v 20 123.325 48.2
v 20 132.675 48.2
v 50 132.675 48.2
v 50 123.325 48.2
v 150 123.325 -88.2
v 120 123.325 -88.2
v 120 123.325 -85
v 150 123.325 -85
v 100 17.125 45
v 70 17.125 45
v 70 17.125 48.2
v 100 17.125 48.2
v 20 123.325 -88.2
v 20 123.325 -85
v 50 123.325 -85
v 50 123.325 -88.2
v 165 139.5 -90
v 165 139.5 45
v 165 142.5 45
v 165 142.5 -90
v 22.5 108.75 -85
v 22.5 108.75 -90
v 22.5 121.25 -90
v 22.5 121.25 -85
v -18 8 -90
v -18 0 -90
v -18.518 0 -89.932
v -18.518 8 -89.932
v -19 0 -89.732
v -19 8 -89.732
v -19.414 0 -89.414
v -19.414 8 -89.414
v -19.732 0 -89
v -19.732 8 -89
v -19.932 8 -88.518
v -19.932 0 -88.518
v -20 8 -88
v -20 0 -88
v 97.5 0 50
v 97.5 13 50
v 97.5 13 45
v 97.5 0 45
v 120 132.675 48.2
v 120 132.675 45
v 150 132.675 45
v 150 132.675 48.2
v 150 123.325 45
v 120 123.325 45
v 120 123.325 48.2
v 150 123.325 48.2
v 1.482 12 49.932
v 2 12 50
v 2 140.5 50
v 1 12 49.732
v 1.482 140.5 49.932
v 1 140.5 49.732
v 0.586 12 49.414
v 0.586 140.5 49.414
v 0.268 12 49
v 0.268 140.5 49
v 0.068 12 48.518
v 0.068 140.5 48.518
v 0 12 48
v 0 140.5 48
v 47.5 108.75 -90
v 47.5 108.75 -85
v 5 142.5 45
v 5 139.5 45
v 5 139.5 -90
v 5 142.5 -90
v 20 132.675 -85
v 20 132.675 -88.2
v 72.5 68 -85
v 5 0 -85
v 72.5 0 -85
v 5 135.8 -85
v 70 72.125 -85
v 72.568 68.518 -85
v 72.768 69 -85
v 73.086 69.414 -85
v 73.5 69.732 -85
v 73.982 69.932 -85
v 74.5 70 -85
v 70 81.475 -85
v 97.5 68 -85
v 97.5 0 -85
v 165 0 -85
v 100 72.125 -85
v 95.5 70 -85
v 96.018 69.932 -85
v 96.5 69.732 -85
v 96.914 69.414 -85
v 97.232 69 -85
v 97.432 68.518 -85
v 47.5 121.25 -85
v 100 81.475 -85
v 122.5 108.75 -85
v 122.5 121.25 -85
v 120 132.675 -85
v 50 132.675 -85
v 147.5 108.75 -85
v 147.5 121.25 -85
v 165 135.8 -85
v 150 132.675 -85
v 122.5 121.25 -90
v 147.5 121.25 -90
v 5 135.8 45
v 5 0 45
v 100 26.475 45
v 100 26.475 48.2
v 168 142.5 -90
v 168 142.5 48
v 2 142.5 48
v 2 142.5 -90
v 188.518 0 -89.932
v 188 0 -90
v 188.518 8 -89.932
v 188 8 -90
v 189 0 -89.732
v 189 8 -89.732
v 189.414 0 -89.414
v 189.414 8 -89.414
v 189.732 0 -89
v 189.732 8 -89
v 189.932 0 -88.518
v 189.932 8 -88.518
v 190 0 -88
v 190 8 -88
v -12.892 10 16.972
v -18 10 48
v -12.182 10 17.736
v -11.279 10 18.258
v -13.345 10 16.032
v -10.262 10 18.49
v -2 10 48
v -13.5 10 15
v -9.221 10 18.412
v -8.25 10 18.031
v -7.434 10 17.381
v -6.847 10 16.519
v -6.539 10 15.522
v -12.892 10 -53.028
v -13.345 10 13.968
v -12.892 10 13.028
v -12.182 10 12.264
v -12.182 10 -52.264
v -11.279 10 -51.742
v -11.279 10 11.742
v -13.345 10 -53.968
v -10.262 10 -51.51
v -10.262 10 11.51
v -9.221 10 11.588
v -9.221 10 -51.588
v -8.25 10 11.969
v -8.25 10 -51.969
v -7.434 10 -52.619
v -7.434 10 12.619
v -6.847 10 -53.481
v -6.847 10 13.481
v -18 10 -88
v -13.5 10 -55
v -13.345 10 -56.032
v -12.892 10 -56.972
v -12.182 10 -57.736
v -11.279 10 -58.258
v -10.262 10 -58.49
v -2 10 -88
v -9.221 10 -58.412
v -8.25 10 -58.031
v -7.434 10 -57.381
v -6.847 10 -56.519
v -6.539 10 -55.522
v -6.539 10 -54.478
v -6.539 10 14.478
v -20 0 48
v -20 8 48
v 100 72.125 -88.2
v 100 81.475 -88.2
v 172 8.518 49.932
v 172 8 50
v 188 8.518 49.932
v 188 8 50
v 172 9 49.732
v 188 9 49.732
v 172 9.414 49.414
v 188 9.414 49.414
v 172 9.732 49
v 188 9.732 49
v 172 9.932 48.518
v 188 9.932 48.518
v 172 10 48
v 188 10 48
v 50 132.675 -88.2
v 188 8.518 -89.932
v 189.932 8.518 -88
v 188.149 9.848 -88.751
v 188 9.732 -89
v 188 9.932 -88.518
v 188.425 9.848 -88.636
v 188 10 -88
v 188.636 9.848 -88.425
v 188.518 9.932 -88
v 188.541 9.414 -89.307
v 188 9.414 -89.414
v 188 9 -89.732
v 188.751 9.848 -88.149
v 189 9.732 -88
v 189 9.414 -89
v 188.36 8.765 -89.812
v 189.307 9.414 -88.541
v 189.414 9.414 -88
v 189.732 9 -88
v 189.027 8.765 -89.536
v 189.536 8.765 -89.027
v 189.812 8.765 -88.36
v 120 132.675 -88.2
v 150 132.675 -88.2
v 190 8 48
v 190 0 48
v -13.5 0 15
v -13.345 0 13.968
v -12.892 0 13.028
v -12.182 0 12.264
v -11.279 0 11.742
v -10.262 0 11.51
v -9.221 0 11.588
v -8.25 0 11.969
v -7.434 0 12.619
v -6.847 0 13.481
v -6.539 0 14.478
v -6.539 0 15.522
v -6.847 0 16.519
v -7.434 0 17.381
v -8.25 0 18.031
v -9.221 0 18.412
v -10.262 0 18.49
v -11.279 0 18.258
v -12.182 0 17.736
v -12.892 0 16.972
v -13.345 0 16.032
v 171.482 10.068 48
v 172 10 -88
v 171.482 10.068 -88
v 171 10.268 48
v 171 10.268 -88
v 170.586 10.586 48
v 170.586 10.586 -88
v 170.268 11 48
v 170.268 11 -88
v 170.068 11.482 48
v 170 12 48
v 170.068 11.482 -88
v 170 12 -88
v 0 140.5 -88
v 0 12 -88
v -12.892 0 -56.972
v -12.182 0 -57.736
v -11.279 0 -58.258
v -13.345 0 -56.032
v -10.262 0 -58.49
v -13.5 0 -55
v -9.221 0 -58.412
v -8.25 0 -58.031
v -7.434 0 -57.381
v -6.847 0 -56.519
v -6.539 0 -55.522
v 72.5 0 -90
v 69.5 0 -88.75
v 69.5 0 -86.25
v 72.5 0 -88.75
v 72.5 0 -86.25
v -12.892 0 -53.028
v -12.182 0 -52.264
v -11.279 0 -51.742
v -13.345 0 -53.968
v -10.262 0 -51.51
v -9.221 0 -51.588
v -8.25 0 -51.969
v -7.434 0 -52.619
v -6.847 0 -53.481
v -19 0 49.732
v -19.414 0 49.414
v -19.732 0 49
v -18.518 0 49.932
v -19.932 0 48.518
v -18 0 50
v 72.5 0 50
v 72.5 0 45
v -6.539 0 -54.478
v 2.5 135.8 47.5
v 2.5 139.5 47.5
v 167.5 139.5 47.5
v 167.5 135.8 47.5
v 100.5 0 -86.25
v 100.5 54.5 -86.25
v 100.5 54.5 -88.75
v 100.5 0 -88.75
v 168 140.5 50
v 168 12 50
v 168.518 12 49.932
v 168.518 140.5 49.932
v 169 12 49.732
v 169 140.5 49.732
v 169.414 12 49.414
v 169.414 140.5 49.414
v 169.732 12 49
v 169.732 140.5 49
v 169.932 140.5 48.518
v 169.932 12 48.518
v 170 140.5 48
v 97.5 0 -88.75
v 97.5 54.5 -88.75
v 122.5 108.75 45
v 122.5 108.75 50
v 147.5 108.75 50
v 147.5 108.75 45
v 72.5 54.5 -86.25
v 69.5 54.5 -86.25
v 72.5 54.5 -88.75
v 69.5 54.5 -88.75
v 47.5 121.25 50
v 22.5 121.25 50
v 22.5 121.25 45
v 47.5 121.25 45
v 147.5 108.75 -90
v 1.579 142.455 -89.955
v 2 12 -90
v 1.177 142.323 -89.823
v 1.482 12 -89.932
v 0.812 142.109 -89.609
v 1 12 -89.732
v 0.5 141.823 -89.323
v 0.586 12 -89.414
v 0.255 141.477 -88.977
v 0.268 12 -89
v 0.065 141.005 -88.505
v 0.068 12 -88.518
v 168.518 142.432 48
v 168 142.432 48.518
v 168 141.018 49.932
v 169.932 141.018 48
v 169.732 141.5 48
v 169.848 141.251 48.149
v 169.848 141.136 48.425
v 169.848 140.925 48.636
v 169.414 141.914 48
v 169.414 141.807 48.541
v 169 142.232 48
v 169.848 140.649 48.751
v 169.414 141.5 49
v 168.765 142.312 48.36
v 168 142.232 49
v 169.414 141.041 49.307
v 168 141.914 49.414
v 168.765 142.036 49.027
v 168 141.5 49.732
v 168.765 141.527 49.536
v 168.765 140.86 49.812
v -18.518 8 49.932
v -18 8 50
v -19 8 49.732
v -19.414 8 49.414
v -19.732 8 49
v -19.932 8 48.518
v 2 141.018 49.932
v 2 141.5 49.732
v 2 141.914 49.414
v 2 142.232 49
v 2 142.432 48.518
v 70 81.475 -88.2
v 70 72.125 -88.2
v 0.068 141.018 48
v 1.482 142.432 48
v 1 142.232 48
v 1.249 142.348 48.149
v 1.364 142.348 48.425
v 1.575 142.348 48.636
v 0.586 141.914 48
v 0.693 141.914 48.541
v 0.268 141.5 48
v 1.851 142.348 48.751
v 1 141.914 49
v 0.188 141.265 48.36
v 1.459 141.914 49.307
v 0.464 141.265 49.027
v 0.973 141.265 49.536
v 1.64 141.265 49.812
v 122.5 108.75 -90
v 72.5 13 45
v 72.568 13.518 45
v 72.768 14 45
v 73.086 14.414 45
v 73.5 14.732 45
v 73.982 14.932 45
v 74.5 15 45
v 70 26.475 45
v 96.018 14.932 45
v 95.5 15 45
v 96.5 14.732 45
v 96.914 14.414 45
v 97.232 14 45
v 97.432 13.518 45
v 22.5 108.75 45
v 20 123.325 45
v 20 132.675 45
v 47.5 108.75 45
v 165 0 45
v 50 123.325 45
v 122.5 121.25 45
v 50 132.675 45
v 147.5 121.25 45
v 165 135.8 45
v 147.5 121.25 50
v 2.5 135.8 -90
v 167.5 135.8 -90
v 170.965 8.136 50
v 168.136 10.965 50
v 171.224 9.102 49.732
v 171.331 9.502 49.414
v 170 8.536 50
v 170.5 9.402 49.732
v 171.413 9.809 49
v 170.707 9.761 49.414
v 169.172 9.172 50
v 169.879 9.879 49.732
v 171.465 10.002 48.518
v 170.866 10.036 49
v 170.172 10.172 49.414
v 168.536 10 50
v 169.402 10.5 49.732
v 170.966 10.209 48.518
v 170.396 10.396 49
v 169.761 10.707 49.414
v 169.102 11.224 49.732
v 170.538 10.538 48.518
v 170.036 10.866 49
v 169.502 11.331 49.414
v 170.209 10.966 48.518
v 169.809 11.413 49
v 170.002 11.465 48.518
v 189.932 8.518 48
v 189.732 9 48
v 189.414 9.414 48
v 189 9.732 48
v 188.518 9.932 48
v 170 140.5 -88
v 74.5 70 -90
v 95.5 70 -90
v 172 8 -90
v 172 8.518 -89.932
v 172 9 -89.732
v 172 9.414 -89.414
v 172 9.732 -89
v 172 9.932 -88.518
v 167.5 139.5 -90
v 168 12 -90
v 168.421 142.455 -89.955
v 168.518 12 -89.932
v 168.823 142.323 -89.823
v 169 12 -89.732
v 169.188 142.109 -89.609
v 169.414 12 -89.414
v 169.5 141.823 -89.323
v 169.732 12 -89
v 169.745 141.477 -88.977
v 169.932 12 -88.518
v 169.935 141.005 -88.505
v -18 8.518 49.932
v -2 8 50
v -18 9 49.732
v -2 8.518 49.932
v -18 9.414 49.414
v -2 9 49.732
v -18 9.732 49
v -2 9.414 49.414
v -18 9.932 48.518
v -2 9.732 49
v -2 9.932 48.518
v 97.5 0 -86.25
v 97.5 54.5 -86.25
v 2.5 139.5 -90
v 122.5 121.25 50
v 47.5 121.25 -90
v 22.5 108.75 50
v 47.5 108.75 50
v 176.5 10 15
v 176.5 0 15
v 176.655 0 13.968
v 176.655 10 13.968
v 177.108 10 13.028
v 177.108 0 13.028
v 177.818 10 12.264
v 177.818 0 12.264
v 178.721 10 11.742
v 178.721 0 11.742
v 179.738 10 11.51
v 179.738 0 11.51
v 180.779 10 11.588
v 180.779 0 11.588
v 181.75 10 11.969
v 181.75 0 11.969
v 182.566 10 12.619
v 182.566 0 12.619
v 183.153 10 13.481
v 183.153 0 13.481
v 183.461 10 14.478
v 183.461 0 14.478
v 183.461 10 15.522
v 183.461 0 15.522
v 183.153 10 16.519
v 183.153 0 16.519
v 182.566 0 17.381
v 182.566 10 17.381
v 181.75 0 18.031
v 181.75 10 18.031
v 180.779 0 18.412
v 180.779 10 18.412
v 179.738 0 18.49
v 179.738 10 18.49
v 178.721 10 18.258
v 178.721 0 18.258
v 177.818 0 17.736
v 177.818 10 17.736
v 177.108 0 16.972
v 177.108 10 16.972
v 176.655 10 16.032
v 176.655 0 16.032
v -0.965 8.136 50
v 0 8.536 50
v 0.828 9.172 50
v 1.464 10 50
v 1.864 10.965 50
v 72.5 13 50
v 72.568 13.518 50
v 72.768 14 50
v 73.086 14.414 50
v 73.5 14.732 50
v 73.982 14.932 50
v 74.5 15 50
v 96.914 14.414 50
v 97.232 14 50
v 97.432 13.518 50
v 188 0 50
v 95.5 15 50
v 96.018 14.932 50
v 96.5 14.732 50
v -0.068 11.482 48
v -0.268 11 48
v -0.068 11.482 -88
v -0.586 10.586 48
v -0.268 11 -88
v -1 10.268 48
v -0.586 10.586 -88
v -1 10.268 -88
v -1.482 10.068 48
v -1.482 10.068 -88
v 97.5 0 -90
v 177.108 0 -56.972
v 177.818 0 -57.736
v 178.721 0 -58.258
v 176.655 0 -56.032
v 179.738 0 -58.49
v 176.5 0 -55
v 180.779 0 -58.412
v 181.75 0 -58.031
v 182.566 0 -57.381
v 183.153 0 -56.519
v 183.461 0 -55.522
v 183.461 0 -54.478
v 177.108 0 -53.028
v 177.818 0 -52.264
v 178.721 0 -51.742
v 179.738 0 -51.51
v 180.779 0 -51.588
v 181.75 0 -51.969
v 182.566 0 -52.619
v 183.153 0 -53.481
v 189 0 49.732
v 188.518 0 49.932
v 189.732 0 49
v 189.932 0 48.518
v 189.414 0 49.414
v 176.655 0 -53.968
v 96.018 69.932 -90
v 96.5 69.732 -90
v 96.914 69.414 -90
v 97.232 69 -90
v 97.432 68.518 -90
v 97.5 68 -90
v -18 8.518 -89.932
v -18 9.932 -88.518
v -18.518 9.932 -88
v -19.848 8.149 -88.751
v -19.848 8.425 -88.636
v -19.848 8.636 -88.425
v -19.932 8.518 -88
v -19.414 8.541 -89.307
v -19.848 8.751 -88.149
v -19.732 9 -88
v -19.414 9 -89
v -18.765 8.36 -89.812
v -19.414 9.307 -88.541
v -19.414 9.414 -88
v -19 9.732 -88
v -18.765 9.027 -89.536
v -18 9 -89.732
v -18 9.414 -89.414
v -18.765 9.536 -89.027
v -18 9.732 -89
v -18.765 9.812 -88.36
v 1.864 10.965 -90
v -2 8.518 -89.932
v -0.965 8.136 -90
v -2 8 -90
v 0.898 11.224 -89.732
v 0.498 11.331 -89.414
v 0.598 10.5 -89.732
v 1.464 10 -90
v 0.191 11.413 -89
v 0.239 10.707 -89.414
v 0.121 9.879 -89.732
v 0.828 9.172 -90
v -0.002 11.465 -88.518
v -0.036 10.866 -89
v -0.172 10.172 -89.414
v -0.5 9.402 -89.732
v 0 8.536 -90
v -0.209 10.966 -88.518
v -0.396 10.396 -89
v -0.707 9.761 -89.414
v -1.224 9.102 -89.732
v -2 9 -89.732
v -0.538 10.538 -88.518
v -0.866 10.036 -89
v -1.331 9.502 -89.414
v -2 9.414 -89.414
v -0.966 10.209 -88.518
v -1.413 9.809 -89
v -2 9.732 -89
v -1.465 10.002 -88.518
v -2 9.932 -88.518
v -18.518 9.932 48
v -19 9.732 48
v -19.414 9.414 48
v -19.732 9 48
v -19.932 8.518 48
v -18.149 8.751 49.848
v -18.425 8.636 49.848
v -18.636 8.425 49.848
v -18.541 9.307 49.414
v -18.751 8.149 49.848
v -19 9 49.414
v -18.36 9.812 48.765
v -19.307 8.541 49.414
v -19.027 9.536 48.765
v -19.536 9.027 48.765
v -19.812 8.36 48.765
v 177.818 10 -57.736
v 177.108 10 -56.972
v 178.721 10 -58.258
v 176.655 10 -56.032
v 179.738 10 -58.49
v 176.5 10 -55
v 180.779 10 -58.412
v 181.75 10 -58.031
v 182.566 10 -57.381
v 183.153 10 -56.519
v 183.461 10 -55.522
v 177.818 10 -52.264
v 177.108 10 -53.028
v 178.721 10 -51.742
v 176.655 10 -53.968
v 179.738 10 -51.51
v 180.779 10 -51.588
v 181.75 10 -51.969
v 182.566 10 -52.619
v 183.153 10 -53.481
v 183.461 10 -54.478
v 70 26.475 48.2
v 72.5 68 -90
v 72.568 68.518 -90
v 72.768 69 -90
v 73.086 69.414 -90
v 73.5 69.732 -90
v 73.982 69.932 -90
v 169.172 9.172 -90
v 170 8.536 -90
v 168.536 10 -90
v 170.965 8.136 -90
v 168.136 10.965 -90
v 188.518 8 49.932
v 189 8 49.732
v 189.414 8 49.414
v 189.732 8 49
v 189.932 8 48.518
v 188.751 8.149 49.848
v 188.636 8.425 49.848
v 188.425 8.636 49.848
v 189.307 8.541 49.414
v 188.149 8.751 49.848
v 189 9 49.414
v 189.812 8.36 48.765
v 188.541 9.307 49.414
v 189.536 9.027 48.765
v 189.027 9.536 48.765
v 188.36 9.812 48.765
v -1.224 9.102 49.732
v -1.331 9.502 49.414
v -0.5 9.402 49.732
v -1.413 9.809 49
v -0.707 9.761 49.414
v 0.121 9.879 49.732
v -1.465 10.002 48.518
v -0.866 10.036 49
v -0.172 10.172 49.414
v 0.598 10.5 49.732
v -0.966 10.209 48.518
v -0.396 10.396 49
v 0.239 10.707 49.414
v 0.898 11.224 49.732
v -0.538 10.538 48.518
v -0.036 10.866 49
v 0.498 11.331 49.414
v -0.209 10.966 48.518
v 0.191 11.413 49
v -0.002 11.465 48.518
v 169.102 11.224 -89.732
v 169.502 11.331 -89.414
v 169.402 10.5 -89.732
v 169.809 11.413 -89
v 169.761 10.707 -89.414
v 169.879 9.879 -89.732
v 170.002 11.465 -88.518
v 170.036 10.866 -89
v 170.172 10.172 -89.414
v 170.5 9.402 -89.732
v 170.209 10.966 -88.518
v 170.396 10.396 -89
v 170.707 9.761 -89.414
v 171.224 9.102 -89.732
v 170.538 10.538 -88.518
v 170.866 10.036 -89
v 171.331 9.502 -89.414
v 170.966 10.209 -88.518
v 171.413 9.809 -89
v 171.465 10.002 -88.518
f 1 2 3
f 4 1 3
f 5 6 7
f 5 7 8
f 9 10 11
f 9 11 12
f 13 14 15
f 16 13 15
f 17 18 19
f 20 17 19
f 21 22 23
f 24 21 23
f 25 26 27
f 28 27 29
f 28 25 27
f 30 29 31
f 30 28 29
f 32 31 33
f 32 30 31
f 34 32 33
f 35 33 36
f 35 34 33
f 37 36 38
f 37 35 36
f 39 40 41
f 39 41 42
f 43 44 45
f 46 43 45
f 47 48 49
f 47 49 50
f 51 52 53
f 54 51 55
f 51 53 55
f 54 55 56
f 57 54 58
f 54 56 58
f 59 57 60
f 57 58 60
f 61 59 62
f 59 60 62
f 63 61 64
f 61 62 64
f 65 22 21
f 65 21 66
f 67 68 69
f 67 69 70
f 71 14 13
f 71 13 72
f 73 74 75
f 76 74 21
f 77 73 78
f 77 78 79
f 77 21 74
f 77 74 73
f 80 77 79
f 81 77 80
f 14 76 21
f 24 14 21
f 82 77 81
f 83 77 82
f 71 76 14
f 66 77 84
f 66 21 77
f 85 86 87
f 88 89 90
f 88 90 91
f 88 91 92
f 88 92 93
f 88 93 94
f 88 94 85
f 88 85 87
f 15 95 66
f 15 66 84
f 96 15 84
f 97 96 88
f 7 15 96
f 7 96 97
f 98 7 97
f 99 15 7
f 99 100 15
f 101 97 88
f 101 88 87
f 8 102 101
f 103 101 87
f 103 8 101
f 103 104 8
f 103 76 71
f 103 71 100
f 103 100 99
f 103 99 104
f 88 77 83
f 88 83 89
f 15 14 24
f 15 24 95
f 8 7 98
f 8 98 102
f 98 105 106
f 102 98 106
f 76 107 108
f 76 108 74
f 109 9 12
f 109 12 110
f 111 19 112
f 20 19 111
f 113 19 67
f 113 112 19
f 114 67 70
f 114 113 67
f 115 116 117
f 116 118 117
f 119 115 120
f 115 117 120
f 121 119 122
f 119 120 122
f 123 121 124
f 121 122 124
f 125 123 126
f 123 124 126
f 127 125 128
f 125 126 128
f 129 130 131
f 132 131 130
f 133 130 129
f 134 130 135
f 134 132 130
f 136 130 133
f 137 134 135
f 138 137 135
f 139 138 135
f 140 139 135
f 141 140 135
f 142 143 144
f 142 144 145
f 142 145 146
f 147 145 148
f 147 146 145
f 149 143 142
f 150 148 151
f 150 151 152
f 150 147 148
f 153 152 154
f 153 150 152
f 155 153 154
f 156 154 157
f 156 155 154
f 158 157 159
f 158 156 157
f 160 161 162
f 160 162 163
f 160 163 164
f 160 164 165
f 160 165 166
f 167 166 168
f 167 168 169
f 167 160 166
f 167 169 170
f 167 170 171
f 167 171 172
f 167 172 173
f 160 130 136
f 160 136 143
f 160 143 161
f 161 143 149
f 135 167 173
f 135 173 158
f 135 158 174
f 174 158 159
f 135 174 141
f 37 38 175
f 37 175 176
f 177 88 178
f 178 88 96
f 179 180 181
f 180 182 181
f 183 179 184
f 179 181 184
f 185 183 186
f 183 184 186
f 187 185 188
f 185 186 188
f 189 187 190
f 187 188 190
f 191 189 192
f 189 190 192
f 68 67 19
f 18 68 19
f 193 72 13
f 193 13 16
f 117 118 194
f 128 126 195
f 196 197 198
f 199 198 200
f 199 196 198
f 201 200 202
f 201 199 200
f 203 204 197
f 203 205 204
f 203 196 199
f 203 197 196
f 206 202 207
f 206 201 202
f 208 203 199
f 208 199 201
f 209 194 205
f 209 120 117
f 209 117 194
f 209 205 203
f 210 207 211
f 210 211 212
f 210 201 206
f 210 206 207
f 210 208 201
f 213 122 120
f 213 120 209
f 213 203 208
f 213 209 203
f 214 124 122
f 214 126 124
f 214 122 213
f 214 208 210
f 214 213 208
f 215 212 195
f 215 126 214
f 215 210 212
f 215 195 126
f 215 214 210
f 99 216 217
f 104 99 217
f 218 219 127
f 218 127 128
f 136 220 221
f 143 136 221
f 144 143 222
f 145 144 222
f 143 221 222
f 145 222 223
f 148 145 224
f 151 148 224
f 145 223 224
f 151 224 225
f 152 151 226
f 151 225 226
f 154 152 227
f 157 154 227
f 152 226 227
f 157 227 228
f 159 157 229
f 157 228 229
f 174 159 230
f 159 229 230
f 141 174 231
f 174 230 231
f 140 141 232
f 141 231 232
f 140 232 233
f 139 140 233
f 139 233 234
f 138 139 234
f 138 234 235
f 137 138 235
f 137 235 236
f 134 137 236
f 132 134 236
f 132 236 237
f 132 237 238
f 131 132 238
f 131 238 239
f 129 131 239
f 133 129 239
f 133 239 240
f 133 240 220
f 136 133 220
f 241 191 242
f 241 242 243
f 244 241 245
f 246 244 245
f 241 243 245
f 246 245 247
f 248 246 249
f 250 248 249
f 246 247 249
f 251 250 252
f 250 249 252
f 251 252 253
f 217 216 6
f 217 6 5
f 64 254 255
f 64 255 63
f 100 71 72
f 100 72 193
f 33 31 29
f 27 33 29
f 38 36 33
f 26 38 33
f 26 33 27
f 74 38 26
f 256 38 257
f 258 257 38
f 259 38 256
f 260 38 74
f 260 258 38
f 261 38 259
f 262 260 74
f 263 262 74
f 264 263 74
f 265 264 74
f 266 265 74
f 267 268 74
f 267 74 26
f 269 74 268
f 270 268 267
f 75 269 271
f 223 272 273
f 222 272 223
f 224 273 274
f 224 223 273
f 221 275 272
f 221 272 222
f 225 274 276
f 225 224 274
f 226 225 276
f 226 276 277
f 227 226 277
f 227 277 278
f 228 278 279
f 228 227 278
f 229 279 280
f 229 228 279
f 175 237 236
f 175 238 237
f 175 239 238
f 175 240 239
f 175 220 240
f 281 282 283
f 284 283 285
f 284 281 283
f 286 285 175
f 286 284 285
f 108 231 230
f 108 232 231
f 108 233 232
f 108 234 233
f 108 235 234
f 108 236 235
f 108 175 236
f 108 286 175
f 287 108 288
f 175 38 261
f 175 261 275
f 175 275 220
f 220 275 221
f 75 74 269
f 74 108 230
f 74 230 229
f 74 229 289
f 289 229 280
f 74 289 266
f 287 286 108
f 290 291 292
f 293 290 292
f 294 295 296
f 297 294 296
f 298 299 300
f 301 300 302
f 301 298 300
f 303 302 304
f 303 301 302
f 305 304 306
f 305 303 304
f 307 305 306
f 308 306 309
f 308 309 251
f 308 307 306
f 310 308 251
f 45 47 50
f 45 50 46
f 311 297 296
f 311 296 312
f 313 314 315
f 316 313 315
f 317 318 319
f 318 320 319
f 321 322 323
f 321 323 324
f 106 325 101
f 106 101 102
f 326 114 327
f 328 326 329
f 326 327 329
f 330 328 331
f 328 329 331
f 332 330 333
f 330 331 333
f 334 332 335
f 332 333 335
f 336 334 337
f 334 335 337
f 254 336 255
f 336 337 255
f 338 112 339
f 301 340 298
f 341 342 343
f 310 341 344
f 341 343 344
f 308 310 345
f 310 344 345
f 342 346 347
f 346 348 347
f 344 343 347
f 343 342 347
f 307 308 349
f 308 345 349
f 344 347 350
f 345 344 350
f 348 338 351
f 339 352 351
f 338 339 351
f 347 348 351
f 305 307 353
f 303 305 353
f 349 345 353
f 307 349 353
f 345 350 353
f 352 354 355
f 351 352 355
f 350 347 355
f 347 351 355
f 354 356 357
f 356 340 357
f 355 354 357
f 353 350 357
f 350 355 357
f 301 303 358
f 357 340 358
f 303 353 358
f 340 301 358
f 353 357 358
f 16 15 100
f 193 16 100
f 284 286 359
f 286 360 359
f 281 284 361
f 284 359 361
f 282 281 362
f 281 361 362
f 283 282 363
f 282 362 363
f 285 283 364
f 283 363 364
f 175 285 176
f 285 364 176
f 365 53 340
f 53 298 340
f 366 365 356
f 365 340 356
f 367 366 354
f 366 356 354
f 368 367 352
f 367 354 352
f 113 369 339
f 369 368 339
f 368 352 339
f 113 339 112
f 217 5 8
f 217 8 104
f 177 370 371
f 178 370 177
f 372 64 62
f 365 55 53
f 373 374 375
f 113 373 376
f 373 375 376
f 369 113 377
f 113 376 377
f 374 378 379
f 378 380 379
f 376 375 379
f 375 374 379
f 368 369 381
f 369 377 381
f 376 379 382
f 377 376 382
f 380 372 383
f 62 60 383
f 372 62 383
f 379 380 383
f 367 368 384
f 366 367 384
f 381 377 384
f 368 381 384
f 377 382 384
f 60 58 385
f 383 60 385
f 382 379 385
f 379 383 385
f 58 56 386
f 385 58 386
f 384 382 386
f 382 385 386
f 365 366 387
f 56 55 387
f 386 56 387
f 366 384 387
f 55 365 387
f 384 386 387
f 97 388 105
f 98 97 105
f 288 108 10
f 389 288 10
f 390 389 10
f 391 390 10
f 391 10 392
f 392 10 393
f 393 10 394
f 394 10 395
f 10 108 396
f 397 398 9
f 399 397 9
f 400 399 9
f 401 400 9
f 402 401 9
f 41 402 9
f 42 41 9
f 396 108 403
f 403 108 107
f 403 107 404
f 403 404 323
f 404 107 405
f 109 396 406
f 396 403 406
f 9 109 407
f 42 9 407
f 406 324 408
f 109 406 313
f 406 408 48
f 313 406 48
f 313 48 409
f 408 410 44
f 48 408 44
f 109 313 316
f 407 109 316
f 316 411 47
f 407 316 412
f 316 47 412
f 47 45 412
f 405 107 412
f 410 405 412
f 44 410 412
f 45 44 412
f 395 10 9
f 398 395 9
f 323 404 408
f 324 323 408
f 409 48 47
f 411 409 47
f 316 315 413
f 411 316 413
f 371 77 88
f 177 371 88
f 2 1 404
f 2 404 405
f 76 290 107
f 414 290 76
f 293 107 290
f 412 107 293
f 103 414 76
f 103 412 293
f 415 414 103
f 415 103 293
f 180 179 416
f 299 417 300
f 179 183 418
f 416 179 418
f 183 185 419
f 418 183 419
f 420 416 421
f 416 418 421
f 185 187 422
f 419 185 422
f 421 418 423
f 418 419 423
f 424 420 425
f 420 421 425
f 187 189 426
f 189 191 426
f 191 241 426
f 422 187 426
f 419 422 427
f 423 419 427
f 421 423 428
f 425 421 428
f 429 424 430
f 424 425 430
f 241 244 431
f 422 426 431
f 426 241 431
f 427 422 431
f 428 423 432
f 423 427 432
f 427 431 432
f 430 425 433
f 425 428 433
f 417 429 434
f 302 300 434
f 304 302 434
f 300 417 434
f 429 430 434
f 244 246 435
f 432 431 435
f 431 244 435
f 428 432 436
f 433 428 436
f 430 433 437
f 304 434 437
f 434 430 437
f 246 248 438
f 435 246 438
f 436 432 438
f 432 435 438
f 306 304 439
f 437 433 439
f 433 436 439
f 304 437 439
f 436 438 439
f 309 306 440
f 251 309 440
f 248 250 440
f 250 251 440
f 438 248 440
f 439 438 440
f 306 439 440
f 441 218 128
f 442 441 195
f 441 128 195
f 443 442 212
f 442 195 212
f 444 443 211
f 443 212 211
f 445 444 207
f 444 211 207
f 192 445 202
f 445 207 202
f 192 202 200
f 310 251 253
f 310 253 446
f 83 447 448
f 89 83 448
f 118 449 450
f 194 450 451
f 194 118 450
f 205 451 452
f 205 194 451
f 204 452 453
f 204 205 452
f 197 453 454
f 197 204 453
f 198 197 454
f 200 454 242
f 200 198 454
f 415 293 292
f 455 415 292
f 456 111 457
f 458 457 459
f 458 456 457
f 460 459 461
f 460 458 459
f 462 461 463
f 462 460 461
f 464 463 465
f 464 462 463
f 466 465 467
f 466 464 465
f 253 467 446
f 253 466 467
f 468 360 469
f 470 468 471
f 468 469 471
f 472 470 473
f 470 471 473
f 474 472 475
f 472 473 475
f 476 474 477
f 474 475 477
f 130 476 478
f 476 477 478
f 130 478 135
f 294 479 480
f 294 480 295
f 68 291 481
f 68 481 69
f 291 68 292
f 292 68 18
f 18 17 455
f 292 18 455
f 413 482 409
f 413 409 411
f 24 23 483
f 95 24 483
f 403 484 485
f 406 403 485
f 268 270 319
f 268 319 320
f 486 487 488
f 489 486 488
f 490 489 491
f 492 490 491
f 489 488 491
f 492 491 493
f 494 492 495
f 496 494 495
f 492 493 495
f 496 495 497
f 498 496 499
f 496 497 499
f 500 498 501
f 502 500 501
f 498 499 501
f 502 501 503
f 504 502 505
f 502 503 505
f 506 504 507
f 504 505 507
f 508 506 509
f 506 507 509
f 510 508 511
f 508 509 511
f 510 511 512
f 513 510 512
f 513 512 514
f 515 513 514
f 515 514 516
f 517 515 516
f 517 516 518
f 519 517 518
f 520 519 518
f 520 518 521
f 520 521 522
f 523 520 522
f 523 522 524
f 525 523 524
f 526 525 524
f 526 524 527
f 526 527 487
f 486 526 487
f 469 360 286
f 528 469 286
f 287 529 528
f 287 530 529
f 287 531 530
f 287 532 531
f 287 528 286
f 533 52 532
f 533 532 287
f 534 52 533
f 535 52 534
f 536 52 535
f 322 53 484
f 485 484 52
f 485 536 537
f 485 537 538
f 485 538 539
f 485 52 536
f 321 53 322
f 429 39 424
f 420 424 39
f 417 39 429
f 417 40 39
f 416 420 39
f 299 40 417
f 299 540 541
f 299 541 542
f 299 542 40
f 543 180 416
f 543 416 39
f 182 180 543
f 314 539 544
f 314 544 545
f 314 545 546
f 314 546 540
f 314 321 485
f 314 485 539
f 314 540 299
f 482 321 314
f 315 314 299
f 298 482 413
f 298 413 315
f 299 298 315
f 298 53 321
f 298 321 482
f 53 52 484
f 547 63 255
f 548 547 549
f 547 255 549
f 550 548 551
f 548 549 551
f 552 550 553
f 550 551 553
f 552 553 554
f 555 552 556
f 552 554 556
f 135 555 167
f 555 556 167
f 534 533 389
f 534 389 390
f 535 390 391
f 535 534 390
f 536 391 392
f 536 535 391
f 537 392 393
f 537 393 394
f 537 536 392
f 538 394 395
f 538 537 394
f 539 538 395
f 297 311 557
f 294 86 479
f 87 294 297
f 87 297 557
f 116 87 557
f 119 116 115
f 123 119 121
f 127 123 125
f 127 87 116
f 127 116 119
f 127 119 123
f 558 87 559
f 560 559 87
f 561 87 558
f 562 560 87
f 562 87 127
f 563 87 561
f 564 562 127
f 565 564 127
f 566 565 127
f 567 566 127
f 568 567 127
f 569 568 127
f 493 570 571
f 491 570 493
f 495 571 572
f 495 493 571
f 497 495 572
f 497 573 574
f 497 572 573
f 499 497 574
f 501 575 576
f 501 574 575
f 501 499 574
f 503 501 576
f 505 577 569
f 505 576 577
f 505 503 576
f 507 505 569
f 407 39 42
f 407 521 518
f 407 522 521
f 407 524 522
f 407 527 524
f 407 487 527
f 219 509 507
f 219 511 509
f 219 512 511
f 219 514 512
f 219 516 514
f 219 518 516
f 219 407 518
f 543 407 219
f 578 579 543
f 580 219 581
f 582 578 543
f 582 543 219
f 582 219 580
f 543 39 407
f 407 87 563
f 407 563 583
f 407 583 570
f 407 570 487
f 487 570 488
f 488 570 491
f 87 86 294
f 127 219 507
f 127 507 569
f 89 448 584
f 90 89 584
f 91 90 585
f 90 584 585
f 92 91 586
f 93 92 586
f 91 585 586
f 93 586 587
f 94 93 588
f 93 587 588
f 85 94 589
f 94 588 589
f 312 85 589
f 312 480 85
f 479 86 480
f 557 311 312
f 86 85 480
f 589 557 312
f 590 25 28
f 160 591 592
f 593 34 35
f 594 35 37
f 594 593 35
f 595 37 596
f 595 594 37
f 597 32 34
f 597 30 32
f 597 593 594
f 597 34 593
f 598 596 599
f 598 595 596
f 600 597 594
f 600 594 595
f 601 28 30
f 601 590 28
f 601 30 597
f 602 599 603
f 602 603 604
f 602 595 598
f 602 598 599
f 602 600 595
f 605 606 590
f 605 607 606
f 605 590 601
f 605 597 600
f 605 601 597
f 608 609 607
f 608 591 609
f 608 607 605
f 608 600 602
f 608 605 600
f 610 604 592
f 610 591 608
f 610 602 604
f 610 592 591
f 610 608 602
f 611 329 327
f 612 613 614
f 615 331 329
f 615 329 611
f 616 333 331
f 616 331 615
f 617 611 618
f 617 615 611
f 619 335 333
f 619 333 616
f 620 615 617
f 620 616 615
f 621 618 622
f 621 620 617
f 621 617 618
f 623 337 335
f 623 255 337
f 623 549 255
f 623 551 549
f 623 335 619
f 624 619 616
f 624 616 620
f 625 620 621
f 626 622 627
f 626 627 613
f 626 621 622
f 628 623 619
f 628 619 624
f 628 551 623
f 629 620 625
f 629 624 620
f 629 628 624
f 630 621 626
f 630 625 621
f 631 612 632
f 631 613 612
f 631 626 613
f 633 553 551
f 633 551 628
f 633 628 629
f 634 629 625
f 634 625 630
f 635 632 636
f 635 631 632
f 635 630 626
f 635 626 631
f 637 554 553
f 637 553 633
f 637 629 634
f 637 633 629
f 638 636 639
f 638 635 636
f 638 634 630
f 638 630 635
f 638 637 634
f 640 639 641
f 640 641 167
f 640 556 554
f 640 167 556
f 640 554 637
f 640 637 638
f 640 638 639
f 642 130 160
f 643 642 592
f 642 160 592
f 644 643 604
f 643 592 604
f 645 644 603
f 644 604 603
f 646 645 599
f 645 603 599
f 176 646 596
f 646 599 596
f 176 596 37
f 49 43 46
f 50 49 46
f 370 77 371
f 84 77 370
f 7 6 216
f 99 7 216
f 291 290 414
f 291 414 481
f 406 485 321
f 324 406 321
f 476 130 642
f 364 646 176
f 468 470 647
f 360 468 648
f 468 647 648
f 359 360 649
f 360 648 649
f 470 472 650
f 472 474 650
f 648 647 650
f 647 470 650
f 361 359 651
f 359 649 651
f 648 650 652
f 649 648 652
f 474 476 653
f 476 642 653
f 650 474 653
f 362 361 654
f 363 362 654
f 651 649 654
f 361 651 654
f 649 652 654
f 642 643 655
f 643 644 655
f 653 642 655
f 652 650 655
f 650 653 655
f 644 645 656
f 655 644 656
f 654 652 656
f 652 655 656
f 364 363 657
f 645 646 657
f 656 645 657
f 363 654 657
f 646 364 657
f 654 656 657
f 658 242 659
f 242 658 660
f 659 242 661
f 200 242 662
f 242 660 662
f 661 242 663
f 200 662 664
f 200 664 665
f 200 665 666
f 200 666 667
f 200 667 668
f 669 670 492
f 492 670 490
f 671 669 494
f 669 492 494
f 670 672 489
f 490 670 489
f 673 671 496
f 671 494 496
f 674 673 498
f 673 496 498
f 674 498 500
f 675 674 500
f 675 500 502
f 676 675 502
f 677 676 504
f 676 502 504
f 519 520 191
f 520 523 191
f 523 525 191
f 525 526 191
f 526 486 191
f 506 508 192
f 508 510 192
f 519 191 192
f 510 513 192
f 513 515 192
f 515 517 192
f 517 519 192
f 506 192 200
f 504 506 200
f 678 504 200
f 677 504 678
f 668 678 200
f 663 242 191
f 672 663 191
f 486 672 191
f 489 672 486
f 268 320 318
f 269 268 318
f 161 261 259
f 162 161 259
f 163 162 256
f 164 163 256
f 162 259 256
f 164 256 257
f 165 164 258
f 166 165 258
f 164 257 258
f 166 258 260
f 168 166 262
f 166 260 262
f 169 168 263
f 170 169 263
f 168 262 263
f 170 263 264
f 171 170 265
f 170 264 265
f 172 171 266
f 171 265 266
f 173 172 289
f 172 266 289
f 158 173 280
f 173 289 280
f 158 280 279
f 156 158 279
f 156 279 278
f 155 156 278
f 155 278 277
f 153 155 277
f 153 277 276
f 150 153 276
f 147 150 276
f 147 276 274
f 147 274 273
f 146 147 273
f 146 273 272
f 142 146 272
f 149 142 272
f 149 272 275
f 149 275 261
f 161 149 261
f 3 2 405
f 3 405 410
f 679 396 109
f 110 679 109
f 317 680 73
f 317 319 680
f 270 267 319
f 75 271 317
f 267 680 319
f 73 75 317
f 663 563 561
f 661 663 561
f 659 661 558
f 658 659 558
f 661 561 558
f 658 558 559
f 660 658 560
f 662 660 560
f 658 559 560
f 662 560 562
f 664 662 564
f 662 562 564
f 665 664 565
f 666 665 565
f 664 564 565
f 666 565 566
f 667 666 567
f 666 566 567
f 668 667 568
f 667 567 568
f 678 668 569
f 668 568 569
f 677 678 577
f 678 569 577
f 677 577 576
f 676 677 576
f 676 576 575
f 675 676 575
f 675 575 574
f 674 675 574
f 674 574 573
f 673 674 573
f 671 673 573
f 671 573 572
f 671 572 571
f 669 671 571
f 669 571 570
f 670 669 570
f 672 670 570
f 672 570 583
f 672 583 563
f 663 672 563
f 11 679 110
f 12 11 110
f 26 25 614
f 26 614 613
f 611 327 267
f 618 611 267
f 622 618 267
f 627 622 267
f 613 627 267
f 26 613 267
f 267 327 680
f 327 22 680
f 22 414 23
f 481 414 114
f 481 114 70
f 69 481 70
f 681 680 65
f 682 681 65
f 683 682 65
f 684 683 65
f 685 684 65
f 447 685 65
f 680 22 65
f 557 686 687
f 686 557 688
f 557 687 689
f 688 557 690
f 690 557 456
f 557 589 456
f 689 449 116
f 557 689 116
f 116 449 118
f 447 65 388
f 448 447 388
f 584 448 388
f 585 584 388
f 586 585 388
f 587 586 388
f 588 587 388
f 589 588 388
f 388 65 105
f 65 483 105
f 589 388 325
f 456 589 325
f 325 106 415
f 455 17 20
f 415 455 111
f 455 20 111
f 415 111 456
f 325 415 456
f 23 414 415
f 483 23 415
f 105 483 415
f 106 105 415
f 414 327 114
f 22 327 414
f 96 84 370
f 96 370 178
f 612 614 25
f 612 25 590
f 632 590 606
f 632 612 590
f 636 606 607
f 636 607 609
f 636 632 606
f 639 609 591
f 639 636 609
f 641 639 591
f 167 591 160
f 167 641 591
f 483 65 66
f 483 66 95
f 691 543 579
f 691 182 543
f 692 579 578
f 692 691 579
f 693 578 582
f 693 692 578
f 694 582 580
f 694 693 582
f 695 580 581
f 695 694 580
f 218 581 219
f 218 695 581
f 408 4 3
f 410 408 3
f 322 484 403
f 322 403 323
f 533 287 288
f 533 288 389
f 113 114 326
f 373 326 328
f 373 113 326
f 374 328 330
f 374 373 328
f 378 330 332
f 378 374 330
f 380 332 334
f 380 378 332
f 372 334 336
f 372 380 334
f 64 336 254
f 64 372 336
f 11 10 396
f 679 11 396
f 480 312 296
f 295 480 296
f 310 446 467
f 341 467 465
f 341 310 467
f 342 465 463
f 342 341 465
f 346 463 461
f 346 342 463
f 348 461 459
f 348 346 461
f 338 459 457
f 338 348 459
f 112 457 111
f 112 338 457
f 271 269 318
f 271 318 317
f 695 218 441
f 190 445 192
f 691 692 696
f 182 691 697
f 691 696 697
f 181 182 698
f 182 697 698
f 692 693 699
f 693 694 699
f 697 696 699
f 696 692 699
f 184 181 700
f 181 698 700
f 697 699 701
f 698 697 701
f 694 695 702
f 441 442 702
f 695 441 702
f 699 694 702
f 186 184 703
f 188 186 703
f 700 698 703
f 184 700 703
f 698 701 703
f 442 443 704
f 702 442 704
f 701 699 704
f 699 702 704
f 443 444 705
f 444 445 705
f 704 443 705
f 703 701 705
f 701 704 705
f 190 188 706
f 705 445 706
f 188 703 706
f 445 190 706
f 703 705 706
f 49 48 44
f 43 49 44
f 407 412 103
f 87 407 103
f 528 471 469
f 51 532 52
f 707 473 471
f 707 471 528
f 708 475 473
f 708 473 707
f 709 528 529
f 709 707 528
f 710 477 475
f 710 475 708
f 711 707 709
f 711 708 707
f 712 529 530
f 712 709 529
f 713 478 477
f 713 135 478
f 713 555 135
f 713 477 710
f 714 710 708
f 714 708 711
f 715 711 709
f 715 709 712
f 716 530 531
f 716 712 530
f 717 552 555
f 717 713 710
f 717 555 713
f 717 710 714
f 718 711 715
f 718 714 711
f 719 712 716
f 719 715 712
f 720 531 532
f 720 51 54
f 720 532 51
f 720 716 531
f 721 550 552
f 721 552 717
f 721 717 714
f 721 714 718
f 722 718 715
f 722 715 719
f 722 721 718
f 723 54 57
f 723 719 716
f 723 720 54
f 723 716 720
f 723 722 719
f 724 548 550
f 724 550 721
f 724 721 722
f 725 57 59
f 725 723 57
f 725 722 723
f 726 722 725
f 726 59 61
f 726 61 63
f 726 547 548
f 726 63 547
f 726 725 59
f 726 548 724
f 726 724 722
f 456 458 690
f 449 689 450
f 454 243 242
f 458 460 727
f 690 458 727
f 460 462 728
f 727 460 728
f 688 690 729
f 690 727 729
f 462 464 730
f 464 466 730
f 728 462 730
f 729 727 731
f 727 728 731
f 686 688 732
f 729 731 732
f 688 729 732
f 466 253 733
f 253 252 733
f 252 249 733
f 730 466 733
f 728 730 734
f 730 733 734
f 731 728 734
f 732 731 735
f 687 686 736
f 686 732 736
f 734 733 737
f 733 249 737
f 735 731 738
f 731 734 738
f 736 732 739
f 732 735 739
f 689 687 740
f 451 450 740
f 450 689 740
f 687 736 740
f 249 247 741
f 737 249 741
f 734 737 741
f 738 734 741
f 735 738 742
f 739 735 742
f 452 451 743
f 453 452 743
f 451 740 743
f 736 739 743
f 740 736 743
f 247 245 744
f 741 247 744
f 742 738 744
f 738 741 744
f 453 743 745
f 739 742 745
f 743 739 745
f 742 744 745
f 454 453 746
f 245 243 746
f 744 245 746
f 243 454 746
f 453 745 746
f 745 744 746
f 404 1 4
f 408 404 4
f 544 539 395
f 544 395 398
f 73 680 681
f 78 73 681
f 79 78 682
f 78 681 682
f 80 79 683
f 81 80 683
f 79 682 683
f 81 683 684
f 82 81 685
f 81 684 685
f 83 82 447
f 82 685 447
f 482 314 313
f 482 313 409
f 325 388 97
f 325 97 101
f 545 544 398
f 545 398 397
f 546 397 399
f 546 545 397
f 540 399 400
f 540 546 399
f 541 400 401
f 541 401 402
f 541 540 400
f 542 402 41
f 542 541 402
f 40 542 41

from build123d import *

# Parameters (mm, degrees)
BOSS_EXTRUDE1_DEPTH      = 170
SKETCH7_W                = 5
SKETCH7_H                = 142.5
BOSS_EXTRUDE2_DEPTH      = 130
SKETCH9_W                = 160
SKETCH9_H                = 130
CUT_EXTRUDE2_DEPTH       = 60
SKETCH10_W               = 165
SKETCH10_H               = 3.7
CUT_EXTRUDE3_DEPTH       = 137.5
SKETCH13_W               = 160
SKETCH13_H               = 6
CUT_EXTRUDE4_DEPTH       = 5
SKETCH15_W               = 20
SKETCH15_H               = 10
BOSS_EXTRUDE3_DEPTH      = 70
SKETCH16_W               = 25
SKETCH16_H               = 12.5
CUT_EXTRUDE5_DEPTH       = 5
M6_CLEARANCE_HOLE1_D     = 7
M6_CLEARANCE_HOLE1_DEPTH = 10
SKETCH26_W               = 30
SKETCH26_H               = 9.35
CUT_EXTRUDE6_DEPTH       = 68.2
SKETCH27_W               = 30
SKETCH27_H               = 9.35
CUT_EXTRUDE8_DEPTH       = 68.2
CUT_EXTRUDE10_DEPTH      = 5
CUT_EXTRUDE11_DEPTH      = 5
SKETCH30_W               = 30
SKETCH30_H               = 9.35
CUT_EXTRUDE12_DEPTH      = 68.2
CUT_EXTRUDE14_DEPTH      = 54.5
FILLET1_R                = 2


with BuildPart() as part:
    # Sketch1 → Boss-Extrude1 (new body)
    with BuildSketch(Plane(origin=(0, 0, 0), x_dir=(0, 0, -1), z_dir=(1, 0, 0))):
        Polygon((90, 142.5), (90, 0), (85, 0), (85, 137.5), (-45, 137.5), (-45, 0), (-50, 0), (-50, 142.5), align=None)
    extrude(amount=BOSS_EXTRUDE1_DEPTH)

    # Sketch7 → Boss-Extrude2 (add)
    with BuildSketch(Plane(origin=(0, 0, 45), x_dir=(-1, 0, 0), z_dir=(0, 0, -1))):
        with Locations((-167.5, 71.25)):
            Rectangle(SKETCH7_W, SKETCH7_H)
        with Locations((-2.5, 71.25)):
            Rectangle(SKETCH7_W, SKETCH7_H)
    extrude(amount=BOSS_EXTRUDE2_DEPTH)

    # Sketch9 → Cut-Extrude2 (cut)
    with BuildSketch(Plane(origin=(0, 142.5, 0), x_dir=(1, 0, 0), z_dir=(0, 1, 0))):
        with Locations((85, 20)):
            Rectangle(SKETCH9_W, SKETCH9_H)
    extrude(amount=-CUT_EXTRUDE2_DEPTH, mode=Mode.SUBTRACT)

    # Sketch10 → Cut-Extrude3 (cut)
    with BuildSketch(Plane(origin=(80, 0, -90), x_dir=(1, 0, 0), z_dir=(0, 0, 1))):
        with Locations((5, 137.65)):
            Rectangle(SKETCH10_W, SKETCH10_H)
    extrude(amount=CUT_EXTRUDE3_DEPTH, mode=Mode.SUBTRACT)

    # Sketch13 → Cut-Extrude4 (cut)
    with BuildSketch(Plane(origin=(80, 0, -90), x_dir=(1, 0, 0), z_dir=(0, 0, 1))):
        with Locations((5, 139.5)):
            Rectangle(SKETCH13_W, SKETCH13_H)
    extrude(amount=CUT_EXTRUDE4_DEPTH, mode=Mode.SUBTRACT)

    # Sketch15 → Boss-Extrude3 (add, symmetric)
    with BuildSketch(Plane.XY.offset(-20)):
        with Locations((-10, 5)):
            Rectangle(SKETCH15_W, SKETCH15_H)
        with Locations((180, 5)):
            Rectangle(SKETCH15_W, SKETCH15_H)
    extrude(amount=BOSS_EXTRUDE3_DEPTH, both=True)

    # Sketch16 → Cut-Extrude5 (cut)
    with BuildSketch(Plane.XY.offset(50)):
        with Locations((35, 115)):
            Rectangle(SKETCH16_W, SKETCH16_H)
        with Locations((135, 115)):
            Rectangle(SKETCH16_W, SKETCH16_H)
    cut_extrude5 = extrude(amount=-CUT_EXTRUDE5_DEPTH, mode=Mode.SUBTRACT)

    # M6 Clearance Hole1
    with Locations(Plane(origin=(0, 10, 0), x_dir=(1, 0, 0), z_dir=(0, 1, 0))):
        with Locations((-10, -15), (-10, 55), (180, 55), (180, -15)):
            Hole(M6_CLEARANCE_HOLE1_D / 2, depth=M6_CLEARANCE_HOLE1_DEPTH)

    # Mirror2: Cut-Extrude5 across plane
    add(cut_extrude5.mirror(Plane.XY.offset(-20)), mode=Mode.SUBTRACT)

    # Sketch26 → Cut-Extrude6 (cut, symmetric)
    with BuildSketch(Plane.XY.offset(-20)):
        with Locations((135, 128)):
            Rectangle(SKETCH26_W, SKETCH26_H)
        with Locations((35, 128)):
            Rectangle(SKETCH26_W, SKETCH26_H)
    extrude(amount=CUT_EXTRUDE6_DEPTH, both=True, mode=Mode.SUBTRACT)

    # Sketch27 → Cut-Extrude8 (cut)
    with BuildSketch(Plane.XY.offset(-20)):
        with Locations((85, 21.8)):
            Rectangle(SKETCH27_W, SKETCH27_H)
    extrude(amount=CUT_EXTRUDE8_DEPTH, mode=Mode.SUBTRACT)

    # Sketch28 → Cut-Extrude10 (cut)
    with BuildSketch(Plane(origin=(0, 0, 50), x_dir=(-1, 0, 0), z_dir=(0, 0, -1))):
        with BuildLine():
            Line((-72.5, 0), (-72.5, 13))
            ThreePointArc((-72.5, 13), (-73.085786438, 14.414213562), (-74.5, 15))
            Line((-74.5, 15), (-95.5, 15))
            ThreePointArc((-95.5, 15), (-96.914213562, 14.414213562), (-97.5, 13))
            Line((-97.5, 13), (-97.5, 0))
            Line((-97.5, 0), (-72.5, 0))
        make_face()
    extrude(amount=CUT_EXTRUDE10_DEPTH, mode=Mode.SUBTRACT)

    # Sketch29 → Cut-Extrude11 (cut)
    with BuildSketch(Plane.XY.offset(-90)):
        with BuildLine():
            Line((95.5, 52.5), (74.5, 52.5))
            ThreePointArc((74.5, 52.5), (73.085786438, 53.085786438), (72.5, 54.5))
            Line((72.5, 54.5), (72.5, 68))
            ThreePointArc((72.5, 68), (73.085786438, 69.414213562), (74.5, 70))
            Line((74.5, 70), (95.5, 70))
            ThreePointArc((95.5, 70), (96.914213562, 69.414213562), (97.5, 68))
            Line((97.5, 68), (97.5, 54.5))
            ThreePointArc((97.5, 54.5), (96.914213562, 53.085786438), (95.5, 52.5))
        make_face()
    extrude(amount=CUT_EXTRUDE11_DEPTH, mode=Mode.SUBTRACT)

    # Sketch30 → Cut-Extrude12 (cut)
    with BuildSketch(Plane.XY.offset(-20)):
        with Locations((85, 76.8)):
            Rectangle(SKETCH30_W, SKETCH30_H)
    extrude(amount=-CUT_EXTRUDE12_DEPTH, mode=Mode.SUBTRACT)

    # Sketch31 → Cut-Extrude14 (cut)
    with BuildSketch(Plane(origin=(0, 0, 0), x_dir=(1, 0, 0), z_dir=(0, 1, 0))):
        Polygon((97.5, 86.25), (100.5, 86.25), (100.5, 88.75), (97.5, 88.75), (97.5, 90), (72.5, 90), (72.5, 88.75), (69.5, 88.75), (69.5, 86.25), (72.5, 86.25), (72.5, 85), (97.5, 85), align=None)
    extrude(amount=CUT_EXTRUDE14_DEPTH, mode=Mode.SUBTRACT)

    # Fillet1
    fillet1_edges = [part.edges().sort_by_distance(p)[0] for p in [
        (0, 76.25, 50),
        (0, 142.5, -20),
        (0, 76.25, -90),
        (-10, 10, -90),
        (0, 10, -20),
        (-20, 5, -90),
        (-20, 10, -20),
        (-10, 10, 50),
        (-20, 5, 50),
        (190, 5, -90),
        (180, 10, -90),
        (190, 10, -20),
        (170, 10, -20),
        (190, 5, 50),
        (180, 10, 50),
        (85, 142.5, 50),
        (170, 76.25, -90),
        (170, 142.5, -20),
        (170, 76.25, 50),
    ]]
    fillet(fillet1_edges, radius=FILLET1_R)


solid = part.part
